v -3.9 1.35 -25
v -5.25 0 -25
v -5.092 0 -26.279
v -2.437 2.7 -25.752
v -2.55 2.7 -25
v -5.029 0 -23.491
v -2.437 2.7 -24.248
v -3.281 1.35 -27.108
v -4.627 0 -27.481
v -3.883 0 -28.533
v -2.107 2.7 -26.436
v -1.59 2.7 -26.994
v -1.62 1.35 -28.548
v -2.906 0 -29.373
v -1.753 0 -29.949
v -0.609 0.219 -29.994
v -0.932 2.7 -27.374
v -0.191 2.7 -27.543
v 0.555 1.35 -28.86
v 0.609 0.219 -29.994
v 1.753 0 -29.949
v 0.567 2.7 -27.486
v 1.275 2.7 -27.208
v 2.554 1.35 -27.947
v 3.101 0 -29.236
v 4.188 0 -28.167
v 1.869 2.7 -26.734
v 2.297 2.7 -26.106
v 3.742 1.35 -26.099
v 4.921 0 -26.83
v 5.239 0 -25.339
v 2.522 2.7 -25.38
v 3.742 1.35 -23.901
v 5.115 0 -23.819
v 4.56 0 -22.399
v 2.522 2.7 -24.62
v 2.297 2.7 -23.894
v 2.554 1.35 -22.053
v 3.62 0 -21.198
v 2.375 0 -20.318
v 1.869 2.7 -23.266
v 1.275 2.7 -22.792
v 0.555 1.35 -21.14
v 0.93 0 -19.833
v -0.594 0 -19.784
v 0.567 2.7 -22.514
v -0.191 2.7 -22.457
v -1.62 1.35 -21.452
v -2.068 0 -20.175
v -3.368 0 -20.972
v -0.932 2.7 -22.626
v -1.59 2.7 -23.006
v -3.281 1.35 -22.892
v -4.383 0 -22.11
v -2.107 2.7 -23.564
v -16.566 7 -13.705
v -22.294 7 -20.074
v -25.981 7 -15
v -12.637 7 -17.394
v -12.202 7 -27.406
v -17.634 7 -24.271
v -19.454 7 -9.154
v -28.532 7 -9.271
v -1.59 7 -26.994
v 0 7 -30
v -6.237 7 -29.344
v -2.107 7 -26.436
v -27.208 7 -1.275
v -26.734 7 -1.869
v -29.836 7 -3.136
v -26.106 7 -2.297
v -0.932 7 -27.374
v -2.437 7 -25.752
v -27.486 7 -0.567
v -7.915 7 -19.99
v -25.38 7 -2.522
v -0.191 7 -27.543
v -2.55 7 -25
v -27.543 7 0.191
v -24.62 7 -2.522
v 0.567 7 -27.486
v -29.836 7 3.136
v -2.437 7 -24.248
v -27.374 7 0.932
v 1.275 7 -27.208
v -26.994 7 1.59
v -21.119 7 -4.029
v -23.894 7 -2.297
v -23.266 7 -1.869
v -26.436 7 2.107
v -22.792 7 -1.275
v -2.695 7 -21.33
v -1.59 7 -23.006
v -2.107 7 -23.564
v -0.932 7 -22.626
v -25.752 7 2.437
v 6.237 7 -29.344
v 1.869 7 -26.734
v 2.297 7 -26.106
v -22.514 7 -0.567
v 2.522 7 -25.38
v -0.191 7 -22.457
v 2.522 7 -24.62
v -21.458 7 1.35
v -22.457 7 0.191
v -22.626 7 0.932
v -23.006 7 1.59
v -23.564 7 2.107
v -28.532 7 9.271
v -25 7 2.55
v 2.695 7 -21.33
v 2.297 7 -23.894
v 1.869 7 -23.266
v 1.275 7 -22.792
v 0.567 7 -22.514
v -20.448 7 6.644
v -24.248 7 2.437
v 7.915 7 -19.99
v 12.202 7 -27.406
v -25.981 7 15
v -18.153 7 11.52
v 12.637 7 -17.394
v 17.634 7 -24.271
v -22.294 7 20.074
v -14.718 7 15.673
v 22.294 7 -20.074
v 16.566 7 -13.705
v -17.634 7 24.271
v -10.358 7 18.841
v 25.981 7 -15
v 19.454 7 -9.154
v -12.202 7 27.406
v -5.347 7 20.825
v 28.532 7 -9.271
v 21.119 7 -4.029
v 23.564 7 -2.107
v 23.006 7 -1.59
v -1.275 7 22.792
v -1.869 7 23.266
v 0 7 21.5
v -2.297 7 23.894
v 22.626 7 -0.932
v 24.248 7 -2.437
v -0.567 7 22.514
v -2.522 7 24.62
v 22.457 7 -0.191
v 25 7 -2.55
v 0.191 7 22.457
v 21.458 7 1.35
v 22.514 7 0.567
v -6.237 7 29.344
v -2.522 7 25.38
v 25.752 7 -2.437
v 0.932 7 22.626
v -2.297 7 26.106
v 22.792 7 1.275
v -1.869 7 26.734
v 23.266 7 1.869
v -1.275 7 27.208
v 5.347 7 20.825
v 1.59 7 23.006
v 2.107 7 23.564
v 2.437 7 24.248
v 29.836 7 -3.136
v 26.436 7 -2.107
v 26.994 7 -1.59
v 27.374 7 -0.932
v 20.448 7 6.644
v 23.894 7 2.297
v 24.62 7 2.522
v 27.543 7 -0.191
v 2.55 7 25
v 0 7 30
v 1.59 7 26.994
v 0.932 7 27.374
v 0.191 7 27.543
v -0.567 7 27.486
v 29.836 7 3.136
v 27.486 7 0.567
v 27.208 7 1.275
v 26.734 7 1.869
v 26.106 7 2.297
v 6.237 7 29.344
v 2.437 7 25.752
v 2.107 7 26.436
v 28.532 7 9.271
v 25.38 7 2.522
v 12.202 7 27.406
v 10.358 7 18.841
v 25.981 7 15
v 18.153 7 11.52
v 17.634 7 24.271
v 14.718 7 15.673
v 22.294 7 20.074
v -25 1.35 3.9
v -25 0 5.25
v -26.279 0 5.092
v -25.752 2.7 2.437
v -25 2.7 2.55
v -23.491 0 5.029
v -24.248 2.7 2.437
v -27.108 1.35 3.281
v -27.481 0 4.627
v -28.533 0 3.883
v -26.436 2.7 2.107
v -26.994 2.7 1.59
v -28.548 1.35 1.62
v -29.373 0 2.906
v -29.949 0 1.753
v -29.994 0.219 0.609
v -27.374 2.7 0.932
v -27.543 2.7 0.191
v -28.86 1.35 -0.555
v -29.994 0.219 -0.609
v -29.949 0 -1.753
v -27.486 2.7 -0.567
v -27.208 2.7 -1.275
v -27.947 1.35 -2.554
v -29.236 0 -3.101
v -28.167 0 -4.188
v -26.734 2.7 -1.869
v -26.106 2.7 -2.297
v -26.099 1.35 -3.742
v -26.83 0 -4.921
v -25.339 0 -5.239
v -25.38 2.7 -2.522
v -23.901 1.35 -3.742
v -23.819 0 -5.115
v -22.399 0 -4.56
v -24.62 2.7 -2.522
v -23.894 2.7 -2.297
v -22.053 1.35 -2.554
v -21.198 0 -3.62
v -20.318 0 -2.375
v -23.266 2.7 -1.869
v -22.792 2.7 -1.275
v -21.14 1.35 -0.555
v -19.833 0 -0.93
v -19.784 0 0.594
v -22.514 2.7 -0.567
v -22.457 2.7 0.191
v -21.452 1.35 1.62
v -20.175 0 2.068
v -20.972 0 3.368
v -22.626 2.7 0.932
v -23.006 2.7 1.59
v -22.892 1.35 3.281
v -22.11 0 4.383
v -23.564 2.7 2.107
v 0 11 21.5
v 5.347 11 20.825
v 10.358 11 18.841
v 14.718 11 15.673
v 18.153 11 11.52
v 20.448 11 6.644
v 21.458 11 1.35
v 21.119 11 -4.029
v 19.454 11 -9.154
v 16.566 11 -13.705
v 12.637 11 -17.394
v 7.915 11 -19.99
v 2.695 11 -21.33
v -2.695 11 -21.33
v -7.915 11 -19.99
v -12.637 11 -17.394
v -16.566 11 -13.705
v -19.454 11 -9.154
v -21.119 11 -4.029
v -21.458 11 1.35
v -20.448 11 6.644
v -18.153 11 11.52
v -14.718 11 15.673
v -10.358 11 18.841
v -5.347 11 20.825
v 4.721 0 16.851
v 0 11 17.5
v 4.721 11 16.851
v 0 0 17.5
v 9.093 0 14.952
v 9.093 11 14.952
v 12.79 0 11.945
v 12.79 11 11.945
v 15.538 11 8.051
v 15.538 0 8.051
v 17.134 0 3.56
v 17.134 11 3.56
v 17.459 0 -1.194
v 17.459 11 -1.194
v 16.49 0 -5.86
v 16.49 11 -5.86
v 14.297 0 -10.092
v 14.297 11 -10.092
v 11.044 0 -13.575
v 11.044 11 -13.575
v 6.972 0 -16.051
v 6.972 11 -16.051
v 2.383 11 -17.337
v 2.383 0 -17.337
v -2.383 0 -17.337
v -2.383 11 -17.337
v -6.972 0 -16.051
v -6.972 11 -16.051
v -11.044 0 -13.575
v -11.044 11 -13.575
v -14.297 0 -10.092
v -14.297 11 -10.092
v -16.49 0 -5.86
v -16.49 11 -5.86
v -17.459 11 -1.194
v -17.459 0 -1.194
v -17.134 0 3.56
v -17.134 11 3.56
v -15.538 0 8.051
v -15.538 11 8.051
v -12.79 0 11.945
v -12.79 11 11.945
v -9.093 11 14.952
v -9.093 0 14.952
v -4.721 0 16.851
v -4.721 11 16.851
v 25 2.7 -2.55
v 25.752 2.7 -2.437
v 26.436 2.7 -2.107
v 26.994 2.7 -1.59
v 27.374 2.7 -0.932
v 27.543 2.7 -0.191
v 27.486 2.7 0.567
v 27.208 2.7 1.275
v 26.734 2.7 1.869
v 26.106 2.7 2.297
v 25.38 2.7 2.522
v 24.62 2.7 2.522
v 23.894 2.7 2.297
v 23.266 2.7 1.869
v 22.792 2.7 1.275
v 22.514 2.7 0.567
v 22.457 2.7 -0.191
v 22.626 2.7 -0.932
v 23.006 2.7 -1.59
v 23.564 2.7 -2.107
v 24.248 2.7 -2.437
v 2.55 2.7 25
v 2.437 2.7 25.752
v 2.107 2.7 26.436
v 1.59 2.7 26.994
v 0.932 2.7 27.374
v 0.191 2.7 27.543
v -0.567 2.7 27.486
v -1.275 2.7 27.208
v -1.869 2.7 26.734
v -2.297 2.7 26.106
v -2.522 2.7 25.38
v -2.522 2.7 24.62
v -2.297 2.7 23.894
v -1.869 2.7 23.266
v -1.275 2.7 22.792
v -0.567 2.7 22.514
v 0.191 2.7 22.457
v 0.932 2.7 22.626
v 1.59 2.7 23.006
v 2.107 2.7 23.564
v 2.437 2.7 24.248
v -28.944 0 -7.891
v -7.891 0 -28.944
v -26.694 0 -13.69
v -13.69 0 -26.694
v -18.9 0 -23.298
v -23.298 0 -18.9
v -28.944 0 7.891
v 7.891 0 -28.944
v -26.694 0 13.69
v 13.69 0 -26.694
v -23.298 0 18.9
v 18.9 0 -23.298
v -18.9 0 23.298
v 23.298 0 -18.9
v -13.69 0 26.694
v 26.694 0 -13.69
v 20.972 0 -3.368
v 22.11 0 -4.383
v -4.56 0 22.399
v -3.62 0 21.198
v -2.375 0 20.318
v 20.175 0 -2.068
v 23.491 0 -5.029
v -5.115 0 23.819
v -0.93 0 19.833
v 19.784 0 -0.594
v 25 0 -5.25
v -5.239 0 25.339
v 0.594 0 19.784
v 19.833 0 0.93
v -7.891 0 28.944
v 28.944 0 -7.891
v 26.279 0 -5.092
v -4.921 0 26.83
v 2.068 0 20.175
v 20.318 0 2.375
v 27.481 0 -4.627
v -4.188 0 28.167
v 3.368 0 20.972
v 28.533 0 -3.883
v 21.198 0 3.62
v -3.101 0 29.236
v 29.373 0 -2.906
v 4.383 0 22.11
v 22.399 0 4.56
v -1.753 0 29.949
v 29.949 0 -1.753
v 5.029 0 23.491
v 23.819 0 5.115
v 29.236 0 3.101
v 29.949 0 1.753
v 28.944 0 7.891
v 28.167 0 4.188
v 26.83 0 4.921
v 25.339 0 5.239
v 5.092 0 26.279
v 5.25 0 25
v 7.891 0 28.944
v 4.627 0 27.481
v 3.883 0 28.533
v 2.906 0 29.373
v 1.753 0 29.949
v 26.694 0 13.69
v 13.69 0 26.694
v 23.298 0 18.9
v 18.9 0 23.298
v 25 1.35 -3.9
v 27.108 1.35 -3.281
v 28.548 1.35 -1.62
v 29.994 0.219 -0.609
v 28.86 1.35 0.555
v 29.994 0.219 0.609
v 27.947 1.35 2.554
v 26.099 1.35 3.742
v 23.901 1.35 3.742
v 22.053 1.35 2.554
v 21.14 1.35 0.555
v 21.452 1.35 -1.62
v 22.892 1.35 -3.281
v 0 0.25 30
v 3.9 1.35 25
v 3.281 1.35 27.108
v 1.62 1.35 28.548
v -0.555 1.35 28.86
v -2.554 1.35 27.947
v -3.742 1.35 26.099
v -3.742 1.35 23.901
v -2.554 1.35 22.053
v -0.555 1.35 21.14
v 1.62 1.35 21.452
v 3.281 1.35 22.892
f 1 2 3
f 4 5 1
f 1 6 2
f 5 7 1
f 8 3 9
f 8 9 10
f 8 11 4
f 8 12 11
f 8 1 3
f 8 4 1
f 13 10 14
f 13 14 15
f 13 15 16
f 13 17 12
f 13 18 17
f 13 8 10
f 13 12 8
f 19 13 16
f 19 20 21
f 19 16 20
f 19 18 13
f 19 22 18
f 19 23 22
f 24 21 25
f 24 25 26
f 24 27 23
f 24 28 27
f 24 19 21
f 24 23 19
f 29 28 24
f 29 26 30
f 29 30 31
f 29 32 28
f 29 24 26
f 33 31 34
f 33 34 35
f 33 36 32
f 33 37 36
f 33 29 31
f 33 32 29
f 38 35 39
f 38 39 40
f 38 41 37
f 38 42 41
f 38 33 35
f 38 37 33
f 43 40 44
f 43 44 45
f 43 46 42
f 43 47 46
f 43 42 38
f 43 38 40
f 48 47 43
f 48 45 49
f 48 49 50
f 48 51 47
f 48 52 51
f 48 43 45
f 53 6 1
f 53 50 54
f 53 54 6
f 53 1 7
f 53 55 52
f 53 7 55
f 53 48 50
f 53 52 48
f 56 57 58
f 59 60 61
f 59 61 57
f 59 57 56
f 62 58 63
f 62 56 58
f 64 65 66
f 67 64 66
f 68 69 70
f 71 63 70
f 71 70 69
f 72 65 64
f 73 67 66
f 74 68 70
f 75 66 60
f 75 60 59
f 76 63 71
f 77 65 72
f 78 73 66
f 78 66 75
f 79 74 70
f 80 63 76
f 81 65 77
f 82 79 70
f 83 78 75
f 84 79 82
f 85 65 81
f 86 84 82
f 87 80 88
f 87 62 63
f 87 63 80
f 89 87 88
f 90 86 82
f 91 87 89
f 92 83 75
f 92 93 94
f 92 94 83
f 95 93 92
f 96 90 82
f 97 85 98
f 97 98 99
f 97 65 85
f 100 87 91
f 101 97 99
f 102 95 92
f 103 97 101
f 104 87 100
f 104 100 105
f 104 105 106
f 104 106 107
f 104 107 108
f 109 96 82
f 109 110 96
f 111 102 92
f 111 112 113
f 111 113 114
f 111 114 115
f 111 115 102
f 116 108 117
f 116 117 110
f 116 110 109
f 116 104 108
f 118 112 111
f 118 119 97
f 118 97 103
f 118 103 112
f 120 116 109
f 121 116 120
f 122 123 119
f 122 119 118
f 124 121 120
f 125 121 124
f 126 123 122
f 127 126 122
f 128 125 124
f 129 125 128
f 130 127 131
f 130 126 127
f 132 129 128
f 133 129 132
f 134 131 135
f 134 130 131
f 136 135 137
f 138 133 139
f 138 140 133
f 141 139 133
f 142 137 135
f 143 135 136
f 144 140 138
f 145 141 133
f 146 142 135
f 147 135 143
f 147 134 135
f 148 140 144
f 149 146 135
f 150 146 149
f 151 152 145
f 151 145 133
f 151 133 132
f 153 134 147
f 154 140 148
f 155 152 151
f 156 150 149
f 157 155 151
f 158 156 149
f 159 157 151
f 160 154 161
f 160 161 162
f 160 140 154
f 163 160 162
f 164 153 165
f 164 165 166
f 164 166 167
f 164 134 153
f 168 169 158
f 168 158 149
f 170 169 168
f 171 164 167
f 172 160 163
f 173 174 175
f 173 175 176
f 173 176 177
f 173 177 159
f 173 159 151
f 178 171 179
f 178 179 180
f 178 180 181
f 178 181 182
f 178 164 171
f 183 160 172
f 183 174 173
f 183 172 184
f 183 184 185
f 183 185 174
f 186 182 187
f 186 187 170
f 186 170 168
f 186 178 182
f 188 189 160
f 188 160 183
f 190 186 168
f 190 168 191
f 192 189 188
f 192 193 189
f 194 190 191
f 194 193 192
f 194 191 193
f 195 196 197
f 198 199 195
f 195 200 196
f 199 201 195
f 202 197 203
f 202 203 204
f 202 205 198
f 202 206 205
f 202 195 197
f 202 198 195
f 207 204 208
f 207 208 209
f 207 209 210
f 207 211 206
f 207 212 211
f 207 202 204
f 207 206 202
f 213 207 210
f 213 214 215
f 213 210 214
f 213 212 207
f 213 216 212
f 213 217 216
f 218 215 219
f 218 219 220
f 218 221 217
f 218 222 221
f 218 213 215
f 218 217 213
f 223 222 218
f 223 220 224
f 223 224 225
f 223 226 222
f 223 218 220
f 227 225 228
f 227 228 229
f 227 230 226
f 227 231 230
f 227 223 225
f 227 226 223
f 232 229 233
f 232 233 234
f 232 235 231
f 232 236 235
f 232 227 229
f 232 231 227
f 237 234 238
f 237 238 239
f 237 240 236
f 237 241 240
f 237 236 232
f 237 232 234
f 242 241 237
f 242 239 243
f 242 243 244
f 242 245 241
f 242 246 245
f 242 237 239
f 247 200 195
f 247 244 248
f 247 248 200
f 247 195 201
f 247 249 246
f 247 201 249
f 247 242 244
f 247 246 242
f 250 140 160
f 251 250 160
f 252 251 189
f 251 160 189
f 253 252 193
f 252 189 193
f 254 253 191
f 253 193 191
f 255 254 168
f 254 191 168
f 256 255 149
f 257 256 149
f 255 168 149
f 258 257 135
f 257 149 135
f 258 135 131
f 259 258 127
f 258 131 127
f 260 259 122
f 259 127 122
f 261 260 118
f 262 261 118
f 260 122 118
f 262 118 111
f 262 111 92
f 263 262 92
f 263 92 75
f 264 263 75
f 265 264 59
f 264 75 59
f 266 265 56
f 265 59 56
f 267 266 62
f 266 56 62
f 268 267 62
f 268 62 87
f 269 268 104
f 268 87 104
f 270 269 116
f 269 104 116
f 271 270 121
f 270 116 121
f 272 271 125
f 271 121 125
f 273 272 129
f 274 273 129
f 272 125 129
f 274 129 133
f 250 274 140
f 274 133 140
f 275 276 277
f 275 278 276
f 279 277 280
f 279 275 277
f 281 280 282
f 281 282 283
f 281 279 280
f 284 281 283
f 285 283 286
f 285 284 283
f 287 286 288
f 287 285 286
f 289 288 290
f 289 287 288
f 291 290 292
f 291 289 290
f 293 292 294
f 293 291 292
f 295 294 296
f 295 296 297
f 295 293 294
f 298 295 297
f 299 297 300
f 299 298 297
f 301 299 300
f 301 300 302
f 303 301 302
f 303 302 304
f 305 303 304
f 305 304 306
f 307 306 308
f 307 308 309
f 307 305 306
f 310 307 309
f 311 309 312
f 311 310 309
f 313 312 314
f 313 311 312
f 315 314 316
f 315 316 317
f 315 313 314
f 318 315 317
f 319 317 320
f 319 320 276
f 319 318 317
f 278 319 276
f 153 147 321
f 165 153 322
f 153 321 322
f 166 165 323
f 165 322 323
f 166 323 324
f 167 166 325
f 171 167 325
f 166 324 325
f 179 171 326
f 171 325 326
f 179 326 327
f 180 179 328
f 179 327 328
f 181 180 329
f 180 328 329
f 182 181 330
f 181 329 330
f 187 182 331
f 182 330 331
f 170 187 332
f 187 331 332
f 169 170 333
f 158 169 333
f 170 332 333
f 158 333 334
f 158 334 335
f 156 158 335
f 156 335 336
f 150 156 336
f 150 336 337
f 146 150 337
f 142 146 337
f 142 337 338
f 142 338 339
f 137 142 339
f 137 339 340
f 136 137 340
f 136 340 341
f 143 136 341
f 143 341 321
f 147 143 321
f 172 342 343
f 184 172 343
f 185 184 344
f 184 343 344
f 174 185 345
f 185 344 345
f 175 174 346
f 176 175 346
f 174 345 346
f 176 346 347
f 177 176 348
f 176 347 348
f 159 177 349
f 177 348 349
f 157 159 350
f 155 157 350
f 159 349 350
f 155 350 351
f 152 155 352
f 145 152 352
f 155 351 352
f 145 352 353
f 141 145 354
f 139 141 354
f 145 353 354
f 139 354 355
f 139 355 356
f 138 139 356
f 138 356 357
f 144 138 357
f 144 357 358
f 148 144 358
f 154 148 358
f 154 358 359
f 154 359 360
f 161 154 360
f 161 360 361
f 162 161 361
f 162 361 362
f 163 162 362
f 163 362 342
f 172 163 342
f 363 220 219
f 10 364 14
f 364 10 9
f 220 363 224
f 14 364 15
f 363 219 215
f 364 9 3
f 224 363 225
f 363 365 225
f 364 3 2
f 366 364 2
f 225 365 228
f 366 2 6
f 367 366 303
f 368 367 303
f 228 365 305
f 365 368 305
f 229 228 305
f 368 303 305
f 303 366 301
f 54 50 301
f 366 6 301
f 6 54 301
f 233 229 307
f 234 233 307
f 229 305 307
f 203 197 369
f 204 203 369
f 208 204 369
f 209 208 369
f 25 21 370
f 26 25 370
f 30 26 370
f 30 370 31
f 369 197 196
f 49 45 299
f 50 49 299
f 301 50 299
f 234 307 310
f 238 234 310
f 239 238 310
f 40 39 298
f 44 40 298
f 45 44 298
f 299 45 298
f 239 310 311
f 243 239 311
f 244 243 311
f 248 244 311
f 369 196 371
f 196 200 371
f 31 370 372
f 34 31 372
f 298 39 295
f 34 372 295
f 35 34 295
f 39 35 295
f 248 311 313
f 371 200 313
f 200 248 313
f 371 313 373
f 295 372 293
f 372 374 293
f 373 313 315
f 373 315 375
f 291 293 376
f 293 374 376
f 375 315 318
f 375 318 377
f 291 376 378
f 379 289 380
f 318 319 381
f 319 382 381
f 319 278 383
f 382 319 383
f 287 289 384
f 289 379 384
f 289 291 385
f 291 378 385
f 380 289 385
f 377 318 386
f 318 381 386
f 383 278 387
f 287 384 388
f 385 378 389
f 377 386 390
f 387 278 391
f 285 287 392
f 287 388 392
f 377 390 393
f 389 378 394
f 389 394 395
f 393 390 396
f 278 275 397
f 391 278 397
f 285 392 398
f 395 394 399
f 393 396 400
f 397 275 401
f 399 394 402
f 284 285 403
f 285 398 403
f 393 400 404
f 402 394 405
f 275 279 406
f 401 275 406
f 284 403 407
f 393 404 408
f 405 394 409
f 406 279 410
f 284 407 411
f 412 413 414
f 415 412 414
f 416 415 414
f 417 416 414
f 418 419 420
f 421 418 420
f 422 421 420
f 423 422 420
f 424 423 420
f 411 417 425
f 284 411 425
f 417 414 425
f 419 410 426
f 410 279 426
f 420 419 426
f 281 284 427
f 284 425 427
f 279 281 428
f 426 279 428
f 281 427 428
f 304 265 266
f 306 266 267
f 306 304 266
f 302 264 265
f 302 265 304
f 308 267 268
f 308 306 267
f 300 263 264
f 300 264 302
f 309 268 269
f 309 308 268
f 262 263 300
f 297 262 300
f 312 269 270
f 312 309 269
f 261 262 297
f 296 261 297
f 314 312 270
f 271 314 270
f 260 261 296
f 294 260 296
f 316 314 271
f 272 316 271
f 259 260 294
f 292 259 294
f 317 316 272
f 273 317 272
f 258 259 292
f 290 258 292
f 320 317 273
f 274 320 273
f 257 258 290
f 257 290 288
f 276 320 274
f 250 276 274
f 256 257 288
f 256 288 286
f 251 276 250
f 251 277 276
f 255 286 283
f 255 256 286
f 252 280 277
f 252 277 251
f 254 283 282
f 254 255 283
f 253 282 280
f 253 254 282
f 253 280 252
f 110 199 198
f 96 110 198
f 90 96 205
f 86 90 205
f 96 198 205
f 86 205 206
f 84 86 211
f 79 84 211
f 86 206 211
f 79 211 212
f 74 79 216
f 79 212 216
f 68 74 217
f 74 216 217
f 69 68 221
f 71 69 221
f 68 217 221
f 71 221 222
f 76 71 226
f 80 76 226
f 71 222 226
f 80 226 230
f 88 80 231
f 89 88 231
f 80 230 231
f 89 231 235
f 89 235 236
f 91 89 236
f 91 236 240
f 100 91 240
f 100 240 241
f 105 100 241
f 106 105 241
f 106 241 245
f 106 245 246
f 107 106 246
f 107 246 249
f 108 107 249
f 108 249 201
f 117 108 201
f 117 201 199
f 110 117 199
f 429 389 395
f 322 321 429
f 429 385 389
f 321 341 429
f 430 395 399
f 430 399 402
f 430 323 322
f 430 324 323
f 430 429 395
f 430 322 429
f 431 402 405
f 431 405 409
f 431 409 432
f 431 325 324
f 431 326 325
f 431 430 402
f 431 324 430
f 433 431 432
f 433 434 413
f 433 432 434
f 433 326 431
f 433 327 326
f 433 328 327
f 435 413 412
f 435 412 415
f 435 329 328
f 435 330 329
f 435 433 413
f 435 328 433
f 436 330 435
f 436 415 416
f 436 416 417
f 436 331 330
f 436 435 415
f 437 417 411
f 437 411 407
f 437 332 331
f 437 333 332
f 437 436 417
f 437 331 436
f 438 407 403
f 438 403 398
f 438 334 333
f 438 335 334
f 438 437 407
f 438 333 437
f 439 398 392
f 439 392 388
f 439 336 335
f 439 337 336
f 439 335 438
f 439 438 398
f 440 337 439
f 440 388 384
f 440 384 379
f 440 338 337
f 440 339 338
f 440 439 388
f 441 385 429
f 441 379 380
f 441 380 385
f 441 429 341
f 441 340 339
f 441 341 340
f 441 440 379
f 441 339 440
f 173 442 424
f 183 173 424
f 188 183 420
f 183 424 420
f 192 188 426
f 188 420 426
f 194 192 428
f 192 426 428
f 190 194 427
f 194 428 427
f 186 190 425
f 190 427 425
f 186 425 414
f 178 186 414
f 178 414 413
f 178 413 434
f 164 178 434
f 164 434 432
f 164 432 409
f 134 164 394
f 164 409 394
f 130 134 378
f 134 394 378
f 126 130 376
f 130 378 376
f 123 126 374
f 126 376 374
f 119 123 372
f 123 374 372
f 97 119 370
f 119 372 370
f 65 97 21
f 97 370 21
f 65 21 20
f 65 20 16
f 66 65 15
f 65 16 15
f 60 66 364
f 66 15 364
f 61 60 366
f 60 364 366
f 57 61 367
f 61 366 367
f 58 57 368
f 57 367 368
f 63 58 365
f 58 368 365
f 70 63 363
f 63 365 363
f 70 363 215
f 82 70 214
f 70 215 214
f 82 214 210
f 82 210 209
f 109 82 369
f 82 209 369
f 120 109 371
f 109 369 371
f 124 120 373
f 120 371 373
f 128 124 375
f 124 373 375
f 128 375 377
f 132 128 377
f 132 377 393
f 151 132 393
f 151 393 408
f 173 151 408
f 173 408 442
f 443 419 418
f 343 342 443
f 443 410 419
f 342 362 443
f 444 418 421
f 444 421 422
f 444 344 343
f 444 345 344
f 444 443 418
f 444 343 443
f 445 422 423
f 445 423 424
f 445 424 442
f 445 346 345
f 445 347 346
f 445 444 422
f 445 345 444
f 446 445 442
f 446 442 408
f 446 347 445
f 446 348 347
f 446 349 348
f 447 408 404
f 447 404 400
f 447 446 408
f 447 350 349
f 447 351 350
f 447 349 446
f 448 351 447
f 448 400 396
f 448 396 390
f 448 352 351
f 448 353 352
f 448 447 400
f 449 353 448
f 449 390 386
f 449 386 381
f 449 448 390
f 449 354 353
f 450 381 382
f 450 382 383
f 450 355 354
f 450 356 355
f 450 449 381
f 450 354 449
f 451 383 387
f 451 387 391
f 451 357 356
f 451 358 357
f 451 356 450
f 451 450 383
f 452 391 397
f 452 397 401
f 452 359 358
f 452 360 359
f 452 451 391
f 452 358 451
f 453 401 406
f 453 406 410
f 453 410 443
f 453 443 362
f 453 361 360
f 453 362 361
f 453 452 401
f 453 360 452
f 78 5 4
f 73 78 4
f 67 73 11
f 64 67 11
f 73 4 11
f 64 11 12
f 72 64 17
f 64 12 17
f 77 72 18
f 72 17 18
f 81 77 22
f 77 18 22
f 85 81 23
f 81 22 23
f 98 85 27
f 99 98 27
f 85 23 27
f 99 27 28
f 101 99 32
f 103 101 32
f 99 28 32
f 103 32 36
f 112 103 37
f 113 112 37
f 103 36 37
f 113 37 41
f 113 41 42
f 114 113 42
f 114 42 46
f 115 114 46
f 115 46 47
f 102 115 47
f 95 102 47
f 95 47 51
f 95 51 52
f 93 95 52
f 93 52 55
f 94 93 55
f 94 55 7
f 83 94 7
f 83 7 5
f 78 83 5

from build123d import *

# Parameters (mm, degrees)
SKETCH1_R                    = 30
SKETCH1_R_2                  = 17.5
BOSS_EXTRUDE1_DEPTH          = 7
SKETCH2_R                    = 21.5
SKETCH2_R_2                  = 17.5
BOSS_EXTRUDE2_DEPTH          = 4
SKETCH4_R                    = 2.55
CUT_EXTRUDE1_DEPTH           = 44.829214002
CHAMFER1_SIZE                = 2.7
CIRPATTERN1_COUNT            = 4
CHAMFER1_OF_CIRPATTERN1_SIZE = 2.7


with BuildPart() as part:
    # Sketch1 → Boss-Extrude1 (new body)
    with BuildSketch(Plane(origin=(0, 0, 0), x_dir=(1, 0, 0), z_dir=(0, 1, 0))):
        with Locations(Location((0, 0, 0), (0, 0, 270))):
            Circle(SKETCH1_R)
        with Locations(Location((0, 0, 0), (0, 0, 270))):
            Circle(SKETCH1_R_2, mode=Mode.SUBTRACT)
    extrude(amount=BOSS_EXTRUDE1_DEPTH)

    # Sketch2 → Boss-Extrude2 (add)
    with BuildSketch(Plane(origin=(0, 7, 0), x_dir=(1, 0, 0), z_dir=(0, 1, 0))):
        with Locations(Location((0, 0, 0), (0, 0, 270))):
            Circle(SKETCH2_R)
        with Locations(Location((0, 0, 0), (0, 0, 270))):
            Circle(SKETCH2_R_2, mode=Mode.SUBTRACT)
    extrude(amount=BOSS_EXTRUDE2_DEPTH)

    # Sketch4 → Cut-Extrude1 (cut, through all)
    with BuildSketch(Plane.XZ):
        with Locations(Location((25, 0, 0), (0, 0, 270))):
            Circle(SKETCH4_R)
    cut_extrude1 = extrude(amount=-CUT_EXTRUDE1_DEPTH, mode=Mode.SUBTRACT)

    # Chamfer1
    # the kernel refuses this chamfer: 2.7 mm, written as the material it takes off along each edge
    with BuildSketch(Plane(origin=(25, 0, 0), x_dir=(0, 0, -1), z_dir=(-1, 0, 0))) as chamfer1_piece_1:
        Polygon((2.55 + CHAMFER1_SIZE, 0), (2.55, -CHAMFER1_SIZE), (2.55, 0), align=None)
    revolve(axis=Axis((25, 0, 0), (0, -1, 0)), mode=Mode.SUBTRACT)

    # CirPattern1: Cut-Extrude1 ×4 about axis
    cirpattern1_axis = Axis((0, 0, 0), (0, 1, 0))
    for i in range(1, CIRPATTERN1_COUNT):
        add(cut_extrude1.rotate(cirpattern1_axis, i * 360 / CIRPATTERN1_COUNT), mode=Mode.SUBTRACT)

    # Chamfer1 of CirPattern1
    # the kernel refuses this chamfer: 2.7 mm, written as the material it takes off along each edge
    with BuildSketch(Plane(origin=(0, 0, -25), x_dir=(-1, 0, 0), z_dir=(0, 0, 1))) as chamfer1_of_cirpattern1_piece_1:
        Polygon((2.55 + CHAMFER1_OF_CIRPATTERN1_SIZE, 0), (2.55, -CHAMFER1_OF_CIRPATTERN1_SIZE), (2.55, 0), align=None)
    revolve(axis=Axis((0, 0, -25), (0, -1, 0)), mode=Mode.SUBTRACT)
    with BuildSketch(Plane(origin=(-25, 0, 0), x_dir=(0, 0, 1), z_dir=(1, 0, 0))) as chamfer1_of_cirpattern1_piece_2:
        Polygon((2.55 + CHAMFER1_OF_CIRPATTERN1_SIZE, 0), (2.55, -CHAMFER1_OF_CIRPATTERN1_SIZE), (2.55, 0), align=None)
    revolve(axis=Axis((-25, 0, 0), (0, -1, 0)), mode=Mode.SUBTRACT)
    with BuildSketch(Plane(origin=(0, 0, 25), x_dir=(1, 0, 0), z_dir=(0, 0, -1))) as chamfer1_of_cirpattern1_piece_3:
        Polygon((2.55 + CHAMFER1_OF_CIRPATTERN1_SIZE, 0), (2.55, -CHAMFER1_OF_CIRPATTERN1_SIZE), (2.55, 0), align=None)
    revolve(axis=Axis((0, 0, 25), (0, -1, 0)), mode=Mode.SUBTRACT)


solid = part.part
